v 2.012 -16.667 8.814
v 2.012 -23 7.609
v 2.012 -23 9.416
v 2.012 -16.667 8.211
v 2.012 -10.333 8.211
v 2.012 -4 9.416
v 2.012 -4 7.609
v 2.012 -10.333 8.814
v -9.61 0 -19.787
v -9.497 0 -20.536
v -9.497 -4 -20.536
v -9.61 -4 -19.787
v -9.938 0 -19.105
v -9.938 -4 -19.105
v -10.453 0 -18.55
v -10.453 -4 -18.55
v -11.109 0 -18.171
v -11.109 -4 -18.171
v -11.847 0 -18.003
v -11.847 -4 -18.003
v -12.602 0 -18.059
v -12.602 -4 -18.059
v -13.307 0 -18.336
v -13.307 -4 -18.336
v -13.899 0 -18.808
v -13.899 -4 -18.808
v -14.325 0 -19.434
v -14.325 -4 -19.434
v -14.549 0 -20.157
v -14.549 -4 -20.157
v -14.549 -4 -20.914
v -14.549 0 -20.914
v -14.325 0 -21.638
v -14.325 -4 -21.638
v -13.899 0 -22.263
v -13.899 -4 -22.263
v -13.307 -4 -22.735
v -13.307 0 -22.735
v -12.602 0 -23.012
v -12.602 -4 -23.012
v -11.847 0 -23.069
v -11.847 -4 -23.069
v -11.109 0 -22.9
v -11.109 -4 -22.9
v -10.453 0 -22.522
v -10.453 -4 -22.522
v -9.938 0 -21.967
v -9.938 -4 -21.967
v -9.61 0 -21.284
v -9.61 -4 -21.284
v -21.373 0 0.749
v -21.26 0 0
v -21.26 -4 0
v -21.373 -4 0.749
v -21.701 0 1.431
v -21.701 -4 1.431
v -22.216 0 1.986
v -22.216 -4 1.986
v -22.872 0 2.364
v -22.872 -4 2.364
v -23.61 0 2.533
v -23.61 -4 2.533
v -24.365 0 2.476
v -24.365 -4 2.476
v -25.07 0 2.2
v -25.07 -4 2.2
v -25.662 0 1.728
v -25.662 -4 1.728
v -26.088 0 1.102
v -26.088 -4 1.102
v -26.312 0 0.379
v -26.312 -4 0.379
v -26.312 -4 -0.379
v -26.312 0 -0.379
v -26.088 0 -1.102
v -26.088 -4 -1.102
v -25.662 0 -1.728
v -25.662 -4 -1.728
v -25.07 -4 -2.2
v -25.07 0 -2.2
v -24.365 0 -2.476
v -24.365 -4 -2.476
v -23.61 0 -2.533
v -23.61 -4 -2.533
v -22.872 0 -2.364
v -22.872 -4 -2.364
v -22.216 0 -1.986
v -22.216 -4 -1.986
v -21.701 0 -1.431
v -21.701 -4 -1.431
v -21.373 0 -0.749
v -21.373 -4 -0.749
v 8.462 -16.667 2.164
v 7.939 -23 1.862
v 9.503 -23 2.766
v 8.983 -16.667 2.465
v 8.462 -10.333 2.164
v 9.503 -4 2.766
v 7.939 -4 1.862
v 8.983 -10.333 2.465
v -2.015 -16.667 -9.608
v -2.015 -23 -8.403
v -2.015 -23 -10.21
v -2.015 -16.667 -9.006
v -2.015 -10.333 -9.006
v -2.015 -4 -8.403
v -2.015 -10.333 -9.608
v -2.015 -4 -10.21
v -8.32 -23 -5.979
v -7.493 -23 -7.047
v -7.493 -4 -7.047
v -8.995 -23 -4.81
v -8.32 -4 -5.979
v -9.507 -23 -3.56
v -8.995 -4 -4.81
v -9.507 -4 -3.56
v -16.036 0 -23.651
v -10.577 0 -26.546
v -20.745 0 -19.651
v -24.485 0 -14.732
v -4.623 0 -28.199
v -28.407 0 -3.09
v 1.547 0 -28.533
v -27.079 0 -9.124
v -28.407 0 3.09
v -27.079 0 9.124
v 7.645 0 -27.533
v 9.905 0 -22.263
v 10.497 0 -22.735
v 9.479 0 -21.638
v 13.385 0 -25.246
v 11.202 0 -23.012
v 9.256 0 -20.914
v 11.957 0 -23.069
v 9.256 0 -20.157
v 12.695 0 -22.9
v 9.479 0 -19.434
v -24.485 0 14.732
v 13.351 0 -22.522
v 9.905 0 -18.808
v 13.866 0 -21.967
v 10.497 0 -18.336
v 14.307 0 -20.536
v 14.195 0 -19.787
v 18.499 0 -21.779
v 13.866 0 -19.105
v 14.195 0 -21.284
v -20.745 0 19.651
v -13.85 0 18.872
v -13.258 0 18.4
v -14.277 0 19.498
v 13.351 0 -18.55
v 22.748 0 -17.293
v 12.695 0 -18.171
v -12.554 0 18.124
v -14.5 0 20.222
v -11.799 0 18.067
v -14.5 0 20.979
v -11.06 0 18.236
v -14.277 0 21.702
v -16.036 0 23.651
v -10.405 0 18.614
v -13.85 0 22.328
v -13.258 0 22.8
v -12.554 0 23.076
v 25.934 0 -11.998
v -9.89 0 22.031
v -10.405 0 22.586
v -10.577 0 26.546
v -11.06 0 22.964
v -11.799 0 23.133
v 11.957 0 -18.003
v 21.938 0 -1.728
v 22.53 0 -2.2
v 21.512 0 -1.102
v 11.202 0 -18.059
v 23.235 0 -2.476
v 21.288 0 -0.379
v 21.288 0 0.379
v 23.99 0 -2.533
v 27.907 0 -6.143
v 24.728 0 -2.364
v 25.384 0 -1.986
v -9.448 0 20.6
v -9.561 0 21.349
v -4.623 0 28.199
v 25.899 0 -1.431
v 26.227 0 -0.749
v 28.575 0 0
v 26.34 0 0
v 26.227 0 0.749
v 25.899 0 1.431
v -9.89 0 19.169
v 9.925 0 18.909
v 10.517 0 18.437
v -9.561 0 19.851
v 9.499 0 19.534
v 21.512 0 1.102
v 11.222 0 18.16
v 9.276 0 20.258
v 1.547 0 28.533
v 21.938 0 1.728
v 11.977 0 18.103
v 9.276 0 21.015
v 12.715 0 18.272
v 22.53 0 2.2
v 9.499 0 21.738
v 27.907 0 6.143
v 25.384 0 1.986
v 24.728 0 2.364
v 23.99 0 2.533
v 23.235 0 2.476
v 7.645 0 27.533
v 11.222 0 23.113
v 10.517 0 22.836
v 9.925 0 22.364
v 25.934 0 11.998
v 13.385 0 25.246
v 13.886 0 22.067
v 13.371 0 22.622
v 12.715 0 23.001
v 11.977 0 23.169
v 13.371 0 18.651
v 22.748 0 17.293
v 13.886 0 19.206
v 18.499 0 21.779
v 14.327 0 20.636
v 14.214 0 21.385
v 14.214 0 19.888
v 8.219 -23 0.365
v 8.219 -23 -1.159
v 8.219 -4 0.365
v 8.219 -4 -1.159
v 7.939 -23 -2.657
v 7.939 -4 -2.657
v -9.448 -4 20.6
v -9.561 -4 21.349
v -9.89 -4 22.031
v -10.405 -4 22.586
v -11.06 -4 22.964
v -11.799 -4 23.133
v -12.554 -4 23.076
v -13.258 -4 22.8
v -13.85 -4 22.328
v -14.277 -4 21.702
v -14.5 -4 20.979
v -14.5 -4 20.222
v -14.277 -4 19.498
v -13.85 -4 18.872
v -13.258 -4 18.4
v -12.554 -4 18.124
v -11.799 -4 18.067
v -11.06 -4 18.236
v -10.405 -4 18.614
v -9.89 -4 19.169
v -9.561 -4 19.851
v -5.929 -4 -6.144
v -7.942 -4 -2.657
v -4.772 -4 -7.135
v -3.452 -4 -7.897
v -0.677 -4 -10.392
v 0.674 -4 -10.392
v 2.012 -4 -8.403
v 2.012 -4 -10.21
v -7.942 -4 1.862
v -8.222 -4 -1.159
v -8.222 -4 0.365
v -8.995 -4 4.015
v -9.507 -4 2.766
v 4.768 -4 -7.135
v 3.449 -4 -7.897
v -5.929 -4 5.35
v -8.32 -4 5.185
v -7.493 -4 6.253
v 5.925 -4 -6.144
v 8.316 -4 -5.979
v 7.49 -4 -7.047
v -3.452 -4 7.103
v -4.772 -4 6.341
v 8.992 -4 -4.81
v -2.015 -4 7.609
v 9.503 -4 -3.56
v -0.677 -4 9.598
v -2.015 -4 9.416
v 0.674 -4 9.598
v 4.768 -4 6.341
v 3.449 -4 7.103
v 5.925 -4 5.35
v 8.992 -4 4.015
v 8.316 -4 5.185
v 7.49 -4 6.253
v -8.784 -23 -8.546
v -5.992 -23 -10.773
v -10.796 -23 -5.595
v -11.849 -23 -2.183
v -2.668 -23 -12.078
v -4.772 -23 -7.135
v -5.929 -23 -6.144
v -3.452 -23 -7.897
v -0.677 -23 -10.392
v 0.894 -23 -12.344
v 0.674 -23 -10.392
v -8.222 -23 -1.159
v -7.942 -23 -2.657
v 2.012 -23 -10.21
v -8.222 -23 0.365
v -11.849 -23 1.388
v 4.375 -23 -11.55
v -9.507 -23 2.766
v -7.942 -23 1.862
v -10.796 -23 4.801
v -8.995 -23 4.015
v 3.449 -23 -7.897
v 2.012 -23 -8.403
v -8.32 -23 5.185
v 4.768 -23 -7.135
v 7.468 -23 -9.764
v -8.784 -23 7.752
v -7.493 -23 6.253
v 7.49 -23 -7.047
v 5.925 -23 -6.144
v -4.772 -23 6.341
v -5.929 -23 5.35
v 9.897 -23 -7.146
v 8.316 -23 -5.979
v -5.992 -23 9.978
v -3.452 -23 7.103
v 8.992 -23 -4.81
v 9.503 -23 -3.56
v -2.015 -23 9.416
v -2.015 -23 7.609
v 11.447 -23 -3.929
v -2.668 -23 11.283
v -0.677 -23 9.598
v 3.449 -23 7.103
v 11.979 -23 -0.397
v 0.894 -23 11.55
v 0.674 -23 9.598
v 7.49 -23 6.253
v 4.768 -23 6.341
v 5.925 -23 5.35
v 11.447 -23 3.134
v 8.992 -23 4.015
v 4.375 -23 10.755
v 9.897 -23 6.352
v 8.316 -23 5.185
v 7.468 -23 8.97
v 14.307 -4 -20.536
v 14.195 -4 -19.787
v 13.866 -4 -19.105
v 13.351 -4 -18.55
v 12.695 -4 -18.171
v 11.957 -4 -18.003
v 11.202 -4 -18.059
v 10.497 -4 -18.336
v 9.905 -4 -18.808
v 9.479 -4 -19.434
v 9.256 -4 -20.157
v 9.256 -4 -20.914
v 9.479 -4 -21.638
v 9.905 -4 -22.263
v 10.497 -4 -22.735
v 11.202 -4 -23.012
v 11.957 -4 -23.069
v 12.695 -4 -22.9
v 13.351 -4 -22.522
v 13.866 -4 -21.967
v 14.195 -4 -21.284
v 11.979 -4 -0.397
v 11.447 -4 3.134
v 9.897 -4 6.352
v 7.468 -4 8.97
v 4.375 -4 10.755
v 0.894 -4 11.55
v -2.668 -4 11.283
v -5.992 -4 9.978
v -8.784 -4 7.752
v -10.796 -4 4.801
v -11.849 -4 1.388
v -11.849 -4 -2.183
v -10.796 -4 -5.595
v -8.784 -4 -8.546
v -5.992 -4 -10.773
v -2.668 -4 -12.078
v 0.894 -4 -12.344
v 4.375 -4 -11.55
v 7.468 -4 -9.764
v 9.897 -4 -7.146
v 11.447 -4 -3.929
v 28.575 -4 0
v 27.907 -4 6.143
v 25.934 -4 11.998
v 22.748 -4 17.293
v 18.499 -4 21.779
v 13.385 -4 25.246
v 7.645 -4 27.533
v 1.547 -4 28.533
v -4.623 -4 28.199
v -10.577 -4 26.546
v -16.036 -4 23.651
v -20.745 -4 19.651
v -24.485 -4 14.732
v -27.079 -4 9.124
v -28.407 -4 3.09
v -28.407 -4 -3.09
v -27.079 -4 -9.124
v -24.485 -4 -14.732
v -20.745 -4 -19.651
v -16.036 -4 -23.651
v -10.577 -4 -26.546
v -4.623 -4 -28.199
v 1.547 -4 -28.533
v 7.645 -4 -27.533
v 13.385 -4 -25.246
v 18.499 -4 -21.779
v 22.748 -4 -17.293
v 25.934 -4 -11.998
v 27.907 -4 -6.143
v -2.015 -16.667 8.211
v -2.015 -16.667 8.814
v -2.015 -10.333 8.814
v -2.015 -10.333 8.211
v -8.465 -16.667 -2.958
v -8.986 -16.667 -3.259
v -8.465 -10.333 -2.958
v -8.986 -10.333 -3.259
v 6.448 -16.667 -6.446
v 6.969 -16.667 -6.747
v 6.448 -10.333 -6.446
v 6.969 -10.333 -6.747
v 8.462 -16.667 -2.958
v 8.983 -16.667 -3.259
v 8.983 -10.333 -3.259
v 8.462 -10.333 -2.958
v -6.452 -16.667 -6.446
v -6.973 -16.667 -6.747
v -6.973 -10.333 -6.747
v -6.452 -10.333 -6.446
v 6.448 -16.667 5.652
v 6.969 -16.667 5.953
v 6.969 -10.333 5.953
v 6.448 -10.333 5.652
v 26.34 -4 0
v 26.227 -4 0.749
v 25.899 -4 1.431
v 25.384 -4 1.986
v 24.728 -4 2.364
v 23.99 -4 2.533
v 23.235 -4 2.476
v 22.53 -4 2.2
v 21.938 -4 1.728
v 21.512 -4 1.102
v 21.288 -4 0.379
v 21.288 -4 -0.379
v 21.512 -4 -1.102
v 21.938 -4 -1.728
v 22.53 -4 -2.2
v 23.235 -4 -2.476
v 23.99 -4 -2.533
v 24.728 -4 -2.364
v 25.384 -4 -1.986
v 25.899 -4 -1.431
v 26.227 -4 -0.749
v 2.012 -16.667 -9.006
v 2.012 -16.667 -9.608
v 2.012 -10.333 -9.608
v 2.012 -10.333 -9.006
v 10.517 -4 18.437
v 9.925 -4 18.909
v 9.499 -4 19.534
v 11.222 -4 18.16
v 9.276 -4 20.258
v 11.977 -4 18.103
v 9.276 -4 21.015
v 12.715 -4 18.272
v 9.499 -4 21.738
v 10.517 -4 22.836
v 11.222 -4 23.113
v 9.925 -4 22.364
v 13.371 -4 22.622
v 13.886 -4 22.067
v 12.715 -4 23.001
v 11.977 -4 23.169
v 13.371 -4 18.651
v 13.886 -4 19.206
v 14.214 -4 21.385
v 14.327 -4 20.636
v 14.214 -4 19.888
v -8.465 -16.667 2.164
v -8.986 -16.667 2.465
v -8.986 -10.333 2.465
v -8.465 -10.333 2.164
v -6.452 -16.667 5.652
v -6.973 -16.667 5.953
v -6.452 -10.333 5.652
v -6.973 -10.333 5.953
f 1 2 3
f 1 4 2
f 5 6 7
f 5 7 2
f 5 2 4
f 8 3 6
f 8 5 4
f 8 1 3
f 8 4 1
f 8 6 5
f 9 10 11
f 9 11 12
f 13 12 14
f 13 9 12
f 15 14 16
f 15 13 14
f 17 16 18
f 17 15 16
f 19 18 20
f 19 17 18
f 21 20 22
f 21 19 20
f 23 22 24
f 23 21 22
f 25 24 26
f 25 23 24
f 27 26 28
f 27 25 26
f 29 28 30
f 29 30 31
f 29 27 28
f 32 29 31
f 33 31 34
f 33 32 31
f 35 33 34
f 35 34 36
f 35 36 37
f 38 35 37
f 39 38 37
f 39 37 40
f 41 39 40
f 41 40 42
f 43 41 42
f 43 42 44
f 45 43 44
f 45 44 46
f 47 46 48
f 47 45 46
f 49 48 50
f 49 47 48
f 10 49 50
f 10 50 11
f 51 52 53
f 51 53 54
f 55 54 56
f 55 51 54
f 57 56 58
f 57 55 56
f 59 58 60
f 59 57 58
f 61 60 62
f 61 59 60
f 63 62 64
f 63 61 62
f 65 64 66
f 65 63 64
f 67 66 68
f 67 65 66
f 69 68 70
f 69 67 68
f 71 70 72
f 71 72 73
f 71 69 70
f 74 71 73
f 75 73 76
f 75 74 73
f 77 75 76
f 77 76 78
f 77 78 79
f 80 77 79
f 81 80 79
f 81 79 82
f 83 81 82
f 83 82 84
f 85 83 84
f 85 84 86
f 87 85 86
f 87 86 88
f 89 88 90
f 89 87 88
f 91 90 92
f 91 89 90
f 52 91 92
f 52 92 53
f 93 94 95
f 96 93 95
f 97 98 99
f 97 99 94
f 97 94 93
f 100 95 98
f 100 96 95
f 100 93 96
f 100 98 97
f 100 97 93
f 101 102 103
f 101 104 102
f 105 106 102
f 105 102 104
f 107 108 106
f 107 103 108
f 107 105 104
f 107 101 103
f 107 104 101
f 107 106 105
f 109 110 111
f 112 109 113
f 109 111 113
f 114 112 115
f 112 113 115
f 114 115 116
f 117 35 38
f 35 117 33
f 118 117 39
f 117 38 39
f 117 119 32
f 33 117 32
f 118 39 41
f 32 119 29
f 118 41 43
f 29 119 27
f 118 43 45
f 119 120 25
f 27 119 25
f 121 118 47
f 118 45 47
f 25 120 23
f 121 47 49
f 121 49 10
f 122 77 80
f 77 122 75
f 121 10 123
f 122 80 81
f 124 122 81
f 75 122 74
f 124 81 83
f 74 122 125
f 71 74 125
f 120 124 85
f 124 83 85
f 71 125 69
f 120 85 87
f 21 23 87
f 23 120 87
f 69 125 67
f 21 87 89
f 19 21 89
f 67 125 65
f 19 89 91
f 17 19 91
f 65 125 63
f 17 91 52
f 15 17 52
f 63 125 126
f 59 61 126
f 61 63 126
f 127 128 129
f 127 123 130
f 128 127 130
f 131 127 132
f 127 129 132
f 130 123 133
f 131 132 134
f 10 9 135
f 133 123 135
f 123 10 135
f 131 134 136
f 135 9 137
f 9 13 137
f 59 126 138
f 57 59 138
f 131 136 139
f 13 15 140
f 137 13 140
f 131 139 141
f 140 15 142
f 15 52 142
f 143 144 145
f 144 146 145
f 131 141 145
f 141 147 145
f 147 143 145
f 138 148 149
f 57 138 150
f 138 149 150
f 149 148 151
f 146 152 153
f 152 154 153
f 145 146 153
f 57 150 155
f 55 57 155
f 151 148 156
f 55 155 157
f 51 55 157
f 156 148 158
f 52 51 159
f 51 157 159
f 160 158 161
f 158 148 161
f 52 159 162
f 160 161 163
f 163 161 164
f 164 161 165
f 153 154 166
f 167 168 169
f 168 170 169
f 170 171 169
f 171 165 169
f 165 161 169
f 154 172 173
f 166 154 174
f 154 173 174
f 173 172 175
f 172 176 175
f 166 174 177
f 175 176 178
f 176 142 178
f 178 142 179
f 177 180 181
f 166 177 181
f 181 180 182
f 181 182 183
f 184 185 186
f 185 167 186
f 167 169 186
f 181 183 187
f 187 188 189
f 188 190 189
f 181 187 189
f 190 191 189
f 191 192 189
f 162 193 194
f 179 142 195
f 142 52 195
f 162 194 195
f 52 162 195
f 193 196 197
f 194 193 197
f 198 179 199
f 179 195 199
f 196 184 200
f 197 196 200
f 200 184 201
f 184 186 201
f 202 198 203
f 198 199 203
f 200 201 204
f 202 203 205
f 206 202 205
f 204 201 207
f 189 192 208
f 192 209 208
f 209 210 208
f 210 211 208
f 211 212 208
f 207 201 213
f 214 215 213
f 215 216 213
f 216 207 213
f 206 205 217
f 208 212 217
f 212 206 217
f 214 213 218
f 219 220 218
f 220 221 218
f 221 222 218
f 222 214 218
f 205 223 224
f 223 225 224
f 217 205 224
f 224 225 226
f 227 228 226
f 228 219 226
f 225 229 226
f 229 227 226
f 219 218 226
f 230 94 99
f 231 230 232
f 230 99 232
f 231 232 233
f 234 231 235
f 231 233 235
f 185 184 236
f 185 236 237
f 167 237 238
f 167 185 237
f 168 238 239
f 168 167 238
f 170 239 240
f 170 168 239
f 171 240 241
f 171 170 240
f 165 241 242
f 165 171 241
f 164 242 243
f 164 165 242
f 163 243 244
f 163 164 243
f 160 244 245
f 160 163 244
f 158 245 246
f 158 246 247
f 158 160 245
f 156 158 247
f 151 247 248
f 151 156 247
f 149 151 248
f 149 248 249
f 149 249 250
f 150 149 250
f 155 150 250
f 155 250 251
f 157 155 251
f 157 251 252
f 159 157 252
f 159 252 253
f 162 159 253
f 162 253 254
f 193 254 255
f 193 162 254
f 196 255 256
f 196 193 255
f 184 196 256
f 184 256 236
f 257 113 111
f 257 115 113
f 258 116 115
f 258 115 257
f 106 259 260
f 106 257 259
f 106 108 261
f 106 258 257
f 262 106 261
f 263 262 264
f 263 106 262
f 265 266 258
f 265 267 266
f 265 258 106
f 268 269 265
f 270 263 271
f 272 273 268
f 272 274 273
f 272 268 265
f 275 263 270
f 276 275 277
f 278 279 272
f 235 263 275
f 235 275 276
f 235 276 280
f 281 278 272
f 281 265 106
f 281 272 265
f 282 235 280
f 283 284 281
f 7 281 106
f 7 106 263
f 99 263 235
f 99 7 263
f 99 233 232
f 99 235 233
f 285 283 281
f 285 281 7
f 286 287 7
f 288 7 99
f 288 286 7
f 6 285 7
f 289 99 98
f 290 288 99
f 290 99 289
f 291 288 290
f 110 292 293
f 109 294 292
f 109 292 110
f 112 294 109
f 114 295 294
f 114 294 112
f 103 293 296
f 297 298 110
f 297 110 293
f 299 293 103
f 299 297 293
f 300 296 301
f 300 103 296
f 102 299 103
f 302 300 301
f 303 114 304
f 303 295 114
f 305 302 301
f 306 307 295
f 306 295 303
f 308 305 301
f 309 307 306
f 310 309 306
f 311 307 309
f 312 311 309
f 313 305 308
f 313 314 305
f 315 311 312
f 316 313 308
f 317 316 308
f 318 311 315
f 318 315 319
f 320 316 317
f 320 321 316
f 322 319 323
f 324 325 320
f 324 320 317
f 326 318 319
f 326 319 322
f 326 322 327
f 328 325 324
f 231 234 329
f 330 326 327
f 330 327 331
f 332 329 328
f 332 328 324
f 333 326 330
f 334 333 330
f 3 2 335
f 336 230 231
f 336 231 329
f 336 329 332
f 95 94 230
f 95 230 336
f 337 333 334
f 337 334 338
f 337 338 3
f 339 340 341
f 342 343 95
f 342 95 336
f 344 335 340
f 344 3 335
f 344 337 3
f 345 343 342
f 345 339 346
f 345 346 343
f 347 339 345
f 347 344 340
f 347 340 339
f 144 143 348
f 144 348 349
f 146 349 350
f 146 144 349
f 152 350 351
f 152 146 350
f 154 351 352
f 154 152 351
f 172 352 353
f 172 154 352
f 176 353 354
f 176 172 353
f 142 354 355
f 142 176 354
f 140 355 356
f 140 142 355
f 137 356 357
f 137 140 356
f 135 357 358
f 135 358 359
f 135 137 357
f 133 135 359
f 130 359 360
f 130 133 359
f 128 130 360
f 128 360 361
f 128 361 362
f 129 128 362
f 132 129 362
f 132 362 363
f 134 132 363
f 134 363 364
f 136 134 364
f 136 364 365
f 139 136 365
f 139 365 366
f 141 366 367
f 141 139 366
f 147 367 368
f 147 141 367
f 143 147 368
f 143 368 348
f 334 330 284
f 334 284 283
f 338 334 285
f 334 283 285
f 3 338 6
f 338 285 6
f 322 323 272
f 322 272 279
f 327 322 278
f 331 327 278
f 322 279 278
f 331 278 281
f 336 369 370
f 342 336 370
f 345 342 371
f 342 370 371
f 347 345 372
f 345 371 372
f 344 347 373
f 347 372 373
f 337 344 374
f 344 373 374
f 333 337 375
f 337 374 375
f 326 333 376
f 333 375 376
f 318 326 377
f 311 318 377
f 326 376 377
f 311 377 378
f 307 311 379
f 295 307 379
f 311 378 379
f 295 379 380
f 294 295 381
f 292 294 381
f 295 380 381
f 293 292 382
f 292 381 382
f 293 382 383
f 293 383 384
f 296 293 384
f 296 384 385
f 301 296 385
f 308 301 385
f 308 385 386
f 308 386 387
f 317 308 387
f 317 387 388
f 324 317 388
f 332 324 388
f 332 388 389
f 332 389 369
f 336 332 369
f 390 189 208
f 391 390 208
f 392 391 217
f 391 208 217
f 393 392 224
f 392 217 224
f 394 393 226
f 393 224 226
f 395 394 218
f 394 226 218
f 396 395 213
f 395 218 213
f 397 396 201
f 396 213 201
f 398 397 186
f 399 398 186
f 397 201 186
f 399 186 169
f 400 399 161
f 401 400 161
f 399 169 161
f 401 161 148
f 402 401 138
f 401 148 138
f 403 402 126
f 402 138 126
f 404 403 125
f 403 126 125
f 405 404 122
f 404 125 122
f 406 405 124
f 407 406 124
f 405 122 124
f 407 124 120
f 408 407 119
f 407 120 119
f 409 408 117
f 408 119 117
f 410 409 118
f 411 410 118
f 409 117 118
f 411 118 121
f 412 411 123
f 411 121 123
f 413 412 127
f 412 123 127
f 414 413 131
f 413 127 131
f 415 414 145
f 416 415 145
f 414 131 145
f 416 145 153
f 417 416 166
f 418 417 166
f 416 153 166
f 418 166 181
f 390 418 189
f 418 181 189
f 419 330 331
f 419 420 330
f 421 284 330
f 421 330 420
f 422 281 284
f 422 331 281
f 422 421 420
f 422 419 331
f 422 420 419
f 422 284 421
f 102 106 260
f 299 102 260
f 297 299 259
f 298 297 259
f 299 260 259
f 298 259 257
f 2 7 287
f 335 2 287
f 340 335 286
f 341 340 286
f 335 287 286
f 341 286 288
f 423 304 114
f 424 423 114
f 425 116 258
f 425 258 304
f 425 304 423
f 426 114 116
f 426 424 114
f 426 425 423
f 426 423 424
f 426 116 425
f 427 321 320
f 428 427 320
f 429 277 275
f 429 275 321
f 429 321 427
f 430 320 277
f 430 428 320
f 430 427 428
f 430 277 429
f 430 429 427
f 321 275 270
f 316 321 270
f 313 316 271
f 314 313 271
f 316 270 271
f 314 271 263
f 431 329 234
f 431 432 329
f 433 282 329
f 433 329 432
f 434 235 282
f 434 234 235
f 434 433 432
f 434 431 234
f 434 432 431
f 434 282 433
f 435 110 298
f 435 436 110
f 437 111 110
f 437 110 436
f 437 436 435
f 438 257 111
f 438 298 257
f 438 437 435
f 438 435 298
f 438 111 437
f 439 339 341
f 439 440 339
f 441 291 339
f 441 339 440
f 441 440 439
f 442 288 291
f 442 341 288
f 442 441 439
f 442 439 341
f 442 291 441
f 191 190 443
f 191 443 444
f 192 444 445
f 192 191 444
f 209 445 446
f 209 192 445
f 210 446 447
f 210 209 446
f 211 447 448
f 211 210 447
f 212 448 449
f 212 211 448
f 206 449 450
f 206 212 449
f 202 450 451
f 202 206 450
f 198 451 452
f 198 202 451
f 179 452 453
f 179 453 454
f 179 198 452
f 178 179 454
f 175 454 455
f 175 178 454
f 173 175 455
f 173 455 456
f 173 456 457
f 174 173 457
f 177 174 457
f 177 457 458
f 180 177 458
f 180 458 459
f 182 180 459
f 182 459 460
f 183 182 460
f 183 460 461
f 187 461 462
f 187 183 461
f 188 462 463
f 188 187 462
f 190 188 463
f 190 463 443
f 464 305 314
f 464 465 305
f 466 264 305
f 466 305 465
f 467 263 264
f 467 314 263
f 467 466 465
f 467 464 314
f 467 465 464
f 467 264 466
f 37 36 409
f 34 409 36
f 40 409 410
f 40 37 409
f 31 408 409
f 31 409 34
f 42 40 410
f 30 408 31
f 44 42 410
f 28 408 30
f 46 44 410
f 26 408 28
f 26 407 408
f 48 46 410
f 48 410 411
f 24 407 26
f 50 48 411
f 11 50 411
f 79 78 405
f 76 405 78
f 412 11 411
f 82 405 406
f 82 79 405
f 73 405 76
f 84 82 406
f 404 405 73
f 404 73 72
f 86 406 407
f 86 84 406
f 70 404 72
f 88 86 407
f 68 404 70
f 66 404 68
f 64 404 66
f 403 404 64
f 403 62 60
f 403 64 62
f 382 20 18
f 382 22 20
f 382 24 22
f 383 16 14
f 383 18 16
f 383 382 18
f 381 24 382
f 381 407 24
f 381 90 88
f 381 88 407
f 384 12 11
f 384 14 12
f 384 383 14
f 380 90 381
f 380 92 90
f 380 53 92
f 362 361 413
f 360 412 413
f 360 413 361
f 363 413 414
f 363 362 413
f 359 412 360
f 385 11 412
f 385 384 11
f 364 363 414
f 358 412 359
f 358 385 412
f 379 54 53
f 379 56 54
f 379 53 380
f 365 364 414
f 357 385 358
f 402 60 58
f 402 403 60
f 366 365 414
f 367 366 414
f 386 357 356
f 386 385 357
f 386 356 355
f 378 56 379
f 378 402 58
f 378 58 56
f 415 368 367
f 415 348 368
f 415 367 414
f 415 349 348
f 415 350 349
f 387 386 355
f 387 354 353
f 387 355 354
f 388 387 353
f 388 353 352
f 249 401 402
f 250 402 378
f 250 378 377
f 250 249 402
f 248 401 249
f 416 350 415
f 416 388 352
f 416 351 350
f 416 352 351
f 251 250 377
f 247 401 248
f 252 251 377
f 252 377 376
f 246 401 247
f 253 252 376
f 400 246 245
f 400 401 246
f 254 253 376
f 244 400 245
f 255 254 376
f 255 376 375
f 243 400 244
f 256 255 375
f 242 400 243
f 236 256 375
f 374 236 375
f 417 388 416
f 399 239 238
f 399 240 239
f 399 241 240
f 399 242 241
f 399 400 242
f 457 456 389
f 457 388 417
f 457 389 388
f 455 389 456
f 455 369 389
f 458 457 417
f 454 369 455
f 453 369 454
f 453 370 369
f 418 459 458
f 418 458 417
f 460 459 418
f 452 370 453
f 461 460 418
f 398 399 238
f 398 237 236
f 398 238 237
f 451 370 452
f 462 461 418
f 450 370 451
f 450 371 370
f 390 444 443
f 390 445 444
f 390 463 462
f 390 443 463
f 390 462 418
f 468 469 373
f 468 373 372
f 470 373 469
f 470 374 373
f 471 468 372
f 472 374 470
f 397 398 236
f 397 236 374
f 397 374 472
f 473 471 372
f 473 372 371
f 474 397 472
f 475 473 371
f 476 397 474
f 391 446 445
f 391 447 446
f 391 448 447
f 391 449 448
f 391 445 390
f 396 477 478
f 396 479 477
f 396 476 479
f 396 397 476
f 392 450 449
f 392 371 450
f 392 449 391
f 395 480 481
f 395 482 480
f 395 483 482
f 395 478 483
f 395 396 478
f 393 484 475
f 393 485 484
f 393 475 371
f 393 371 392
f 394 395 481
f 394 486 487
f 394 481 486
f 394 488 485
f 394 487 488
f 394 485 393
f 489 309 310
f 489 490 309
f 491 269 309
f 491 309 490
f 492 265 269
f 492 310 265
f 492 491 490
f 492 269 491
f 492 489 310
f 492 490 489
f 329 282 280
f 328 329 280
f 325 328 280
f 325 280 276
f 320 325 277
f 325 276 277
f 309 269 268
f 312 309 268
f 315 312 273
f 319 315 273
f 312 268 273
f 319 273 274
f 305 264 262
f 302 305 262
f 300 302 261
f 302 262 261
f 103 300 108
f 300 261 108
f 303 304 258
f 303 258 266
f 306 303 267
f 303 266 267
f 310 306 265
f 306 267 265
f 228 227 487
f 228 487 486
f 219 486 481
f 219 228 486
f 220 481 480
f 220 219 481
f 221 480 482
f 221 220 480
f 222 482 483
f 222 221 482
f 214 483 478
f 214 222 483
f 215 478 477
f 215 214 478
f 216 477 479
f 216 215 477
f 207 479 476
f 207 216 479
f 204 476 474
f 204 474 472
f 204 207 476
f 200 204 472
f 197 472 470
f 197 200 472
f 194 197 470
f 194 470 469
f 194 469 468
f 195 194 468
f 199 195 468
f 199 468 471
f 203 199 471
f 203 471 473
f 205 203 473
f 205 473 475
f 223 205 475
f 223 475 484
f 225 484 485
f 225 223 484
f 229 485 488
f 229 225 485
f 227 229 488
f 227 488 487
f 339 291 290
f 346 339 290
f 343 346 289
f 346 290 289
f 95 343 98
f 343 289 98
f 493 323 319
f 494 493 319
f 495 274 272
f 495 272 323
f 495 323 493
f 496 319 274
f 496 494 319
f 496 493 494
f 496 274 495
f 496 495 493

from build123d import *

# Parameters (mm, degrees)
F1_R     = 11.980735
F2_DEPTH = 23
F0_R     = 28.575
F0_R_2   = 2.54
F3_DEPTH = 4


with BuildPart() as f2:
    # F1 (on Front) → F2 (new body)
    with BuildSketch(Plane.XZ):
        with Locations((-0.001662, -0.397164)):
            Circle(F1_R)
        with BuildLine():
            add(Edge.make_bspline(
                [(2.011906, 7.609146), (2.011906, 7.809895), (2.011906, 8.211393), (2.011906, 8.813639), (2.011906, 9.215137), (2.011906, 9.415886)],
                knots=[0, 0, 0, 0, 0.602247, 1.204493, 1.80674, 1.80674, 1.80674, 1.80674], degree=3))
            ThreePointArc((2.011906, 7.609146), (4.126154, 6.752423), (5.925221, 5.349793))
            add(Edge.make_bspline(
                [(7.489904, 6.253163), (7.316434, 6.15301), (6.969194, 5.952531), (6.447633, 5.651408), (6.099543, 5.450437), (5.925221, 5.349793)],
                knots=[0, 0, 0, 0, 0.600918, 1.202873, 1.80674, 1.80674, 1.80674, 1.80674], degree=3))
            ThreePointArc((7.489904, 6.253163), (8.673752, 4.611589), (9.503473, 2.765559))
            add(Edge.make_bspline(
                [(7.93879, 1.862189), (8.113111, 1.962834), (8.461202, 2.163804), (8.982763, 2.464927), (9.330002, 2.665406), (9.503473, 2.765559)],
                knots=[0, 0, 0, 0, 0.603867, 1.205822, 1.80674, 1.80674, 1.80674, 1.80674], degree=3))
            ThreePointArc((7.93879, 1.862189), (8.25397, -0.397164), (7.93879, -2.656517))
            add(Edge.make_bspline(
                [(9.503473, -3.559887), (9.330002, -3.459734), (8.982763, -3.259255), (8.461202, -2.958132), (8.113111, -2.757162), (7.93879, -2.656517)],
                knots=[0, 0, 0, 0, 0.600918, 1.202873, 1.80674, 1.80674, 1.80674, 1.80674], degree=3))
            ThreePointArc((9.503473, -3.559887), (8.673752, -5.405917), (7.489904, -7.047491))
            add(Edge.make_bspline(
                [(5.925221, -6.144121), (6.099543, -6.244765), (6.447633, -6.445736), (6.969194, -6.746859), (7.316434, -6.947338), (7.489904, -7.047491)],
                knots=[0, 0, 0, 0, 0.603867, 1.205822, 1.80674, 1.80674, 1.80674, 1.80674], degree=3))
            ThreePointArc((5.925221, -6.144121), (4.126154, -7.546751), (2.011906, -8.403474))
            add(Edge.make_bspline(
                [(2.011906, -10.210214), (2.011906, -10.009465), (2.011906, -9.607967), (2.011906, -9.005721), (2.011906, -8.604223), (2.011906, -8.403474)],
                knots=[0, 0, 0, 0, 0.602247, 1.204493, 1.80674, 1.80674, 1.80674, 1.80674], degree=3))
            ThreePointArc((2.011906, -10.210214), (-0.001662, -10.414669), (-2.015231, -10.210214))
            add(Edge.make_bspline(
                [(-2.015231, -8.403474), (-2.015231, -8.604223), (-2.015231, -9.005721), (-2.015231, -9.607967), (-2.015231, -10.009465), (-2.015231, -10.210214)],
                knots=[0, 0, 0, 0, 0.602247, 1.204493, 1.80674, 1.80674, 1.80674, 1.80674], degree=3))
            ThreePointArc((-2.015231, -8.403474), (-4.129479, -7.546751), (-5.928546, -6.144121))
            add(Edge.make_bspline(
                [(-7.493228, -7.047491), (-7.319758, -6.947338), (-6.972519, -6.746859), (-6.450958, -6.445736), (-6.102867, -6.244765), (-5.928546, -6.144121)],
                knots=[0, 0, 0, 0, 0.600918, 1.202873, 1.80674, 1.80674, 1.80674, 1.80674], degree=3))
            ThreePointArc((-7.493228, -7.047491), (-8.677076, -5.405917), (-9.506797, -3.559887))
            add(Edge.make_bspline(
                [(-7.942115, -2.656517), (-8.116436, -2.757162), (-8.464527, -2.958132), (-8.986088, -3.259255), (-9.333327, -3.459734), (-9.506797, -3.559887)],
                knots=[0, 0, 0, 0, 0.603867, 1.205822, 1.80674, 1.80674, 1.80674, 1.80674], degree=3))
            ThreePointArc((-7.942115, -2.656517), (-8.257295, -0.397164), (-7.942115, 1.862189))
            add(Edge.make_bspline(
                [(-9.506797, 2.765559), (-9.333327, 2.665406), (-8.986088, 2.464927), (-8.464527, 2.163804), (-8.116436, 1.962834), (-7.942115, 1.862189)],
                knots=[0, 0, 0, 0, 0.600918, 1.202873, 1.80674, 1.80674, 1.80674, 1.80674], degree=3))
            ThreePointArc((-9.506797, 2.765559), (-8.677076, 4.611589), (-7.493228, 6.253163))
            add(Edge.make_bspline(
                [(-5.928546, 5.349793), (-6.102867, 5.450437), (-6.450958, 5.651408), (-6.972519, 5.952531), (-7.319758, 6.15301), (-7.493228, 6.253163)],
                knots=[0, 0, 0, 0, 0.603867, 1.205822, 1.80674, 1.80674, 1.80674, 1.80674], degree=3))
            ThreePointArc((-5.928546, 5.349793), (-4.129479, 6.752423), (-2.015231, 7.609146))
            add(Edge.make_bspline(
                [(-2.015231, 9.415886), (-2.015231, 9.215137), (-2.015231, 8.813639), (-2.015231, 8.211393), (-2.015231, 7.809895), (-2.015231, 7.609146)],
                knots=[0, 0, 0, 0, 0.602247, 1.204493, 1.80674, 1.80674, 1.80674, 1.80674], degree=3))
            ThreePointArc((-2.015231, 9.415886), (-0.001662, 9.620341), (2.011906, 9.415886))
        make_face(mode=Mode.SUBTRACT)
    extrude(amount=F2_DEPTH)

    # F0 (on Front) → F3 (join)
    with BuildSketch(Plane.XZ):
        Circle(F0_R)
        with Locations((-12.036908, -20.535689)):
            Circle(F0_R_2, mode=Mode.SUBTRACT)
        with Locations((11.767376, -20.535689)):
            Circle(F0_R_2, mode=Mode.SUBTRACT)
        with Locations((-23.8, 0)):
            Circle(F0_R_2, mode=Mode.SUBTRACT)
        with Locations((-11.988438, 20.600075)):
            Circle(F0_R_2, mode=Mode.SUBTRACT)
        with Locations((23.8, 0)):
            Circle(F0_R_2, mode=Mode.SUBTRACT)
        with Locations((11.78722, 20.636372)):
            Circle(F0_R_2, mode=Mode.SUBTRACT)
    extrude(amount=F3_DEPTH)


solid = f2.part
